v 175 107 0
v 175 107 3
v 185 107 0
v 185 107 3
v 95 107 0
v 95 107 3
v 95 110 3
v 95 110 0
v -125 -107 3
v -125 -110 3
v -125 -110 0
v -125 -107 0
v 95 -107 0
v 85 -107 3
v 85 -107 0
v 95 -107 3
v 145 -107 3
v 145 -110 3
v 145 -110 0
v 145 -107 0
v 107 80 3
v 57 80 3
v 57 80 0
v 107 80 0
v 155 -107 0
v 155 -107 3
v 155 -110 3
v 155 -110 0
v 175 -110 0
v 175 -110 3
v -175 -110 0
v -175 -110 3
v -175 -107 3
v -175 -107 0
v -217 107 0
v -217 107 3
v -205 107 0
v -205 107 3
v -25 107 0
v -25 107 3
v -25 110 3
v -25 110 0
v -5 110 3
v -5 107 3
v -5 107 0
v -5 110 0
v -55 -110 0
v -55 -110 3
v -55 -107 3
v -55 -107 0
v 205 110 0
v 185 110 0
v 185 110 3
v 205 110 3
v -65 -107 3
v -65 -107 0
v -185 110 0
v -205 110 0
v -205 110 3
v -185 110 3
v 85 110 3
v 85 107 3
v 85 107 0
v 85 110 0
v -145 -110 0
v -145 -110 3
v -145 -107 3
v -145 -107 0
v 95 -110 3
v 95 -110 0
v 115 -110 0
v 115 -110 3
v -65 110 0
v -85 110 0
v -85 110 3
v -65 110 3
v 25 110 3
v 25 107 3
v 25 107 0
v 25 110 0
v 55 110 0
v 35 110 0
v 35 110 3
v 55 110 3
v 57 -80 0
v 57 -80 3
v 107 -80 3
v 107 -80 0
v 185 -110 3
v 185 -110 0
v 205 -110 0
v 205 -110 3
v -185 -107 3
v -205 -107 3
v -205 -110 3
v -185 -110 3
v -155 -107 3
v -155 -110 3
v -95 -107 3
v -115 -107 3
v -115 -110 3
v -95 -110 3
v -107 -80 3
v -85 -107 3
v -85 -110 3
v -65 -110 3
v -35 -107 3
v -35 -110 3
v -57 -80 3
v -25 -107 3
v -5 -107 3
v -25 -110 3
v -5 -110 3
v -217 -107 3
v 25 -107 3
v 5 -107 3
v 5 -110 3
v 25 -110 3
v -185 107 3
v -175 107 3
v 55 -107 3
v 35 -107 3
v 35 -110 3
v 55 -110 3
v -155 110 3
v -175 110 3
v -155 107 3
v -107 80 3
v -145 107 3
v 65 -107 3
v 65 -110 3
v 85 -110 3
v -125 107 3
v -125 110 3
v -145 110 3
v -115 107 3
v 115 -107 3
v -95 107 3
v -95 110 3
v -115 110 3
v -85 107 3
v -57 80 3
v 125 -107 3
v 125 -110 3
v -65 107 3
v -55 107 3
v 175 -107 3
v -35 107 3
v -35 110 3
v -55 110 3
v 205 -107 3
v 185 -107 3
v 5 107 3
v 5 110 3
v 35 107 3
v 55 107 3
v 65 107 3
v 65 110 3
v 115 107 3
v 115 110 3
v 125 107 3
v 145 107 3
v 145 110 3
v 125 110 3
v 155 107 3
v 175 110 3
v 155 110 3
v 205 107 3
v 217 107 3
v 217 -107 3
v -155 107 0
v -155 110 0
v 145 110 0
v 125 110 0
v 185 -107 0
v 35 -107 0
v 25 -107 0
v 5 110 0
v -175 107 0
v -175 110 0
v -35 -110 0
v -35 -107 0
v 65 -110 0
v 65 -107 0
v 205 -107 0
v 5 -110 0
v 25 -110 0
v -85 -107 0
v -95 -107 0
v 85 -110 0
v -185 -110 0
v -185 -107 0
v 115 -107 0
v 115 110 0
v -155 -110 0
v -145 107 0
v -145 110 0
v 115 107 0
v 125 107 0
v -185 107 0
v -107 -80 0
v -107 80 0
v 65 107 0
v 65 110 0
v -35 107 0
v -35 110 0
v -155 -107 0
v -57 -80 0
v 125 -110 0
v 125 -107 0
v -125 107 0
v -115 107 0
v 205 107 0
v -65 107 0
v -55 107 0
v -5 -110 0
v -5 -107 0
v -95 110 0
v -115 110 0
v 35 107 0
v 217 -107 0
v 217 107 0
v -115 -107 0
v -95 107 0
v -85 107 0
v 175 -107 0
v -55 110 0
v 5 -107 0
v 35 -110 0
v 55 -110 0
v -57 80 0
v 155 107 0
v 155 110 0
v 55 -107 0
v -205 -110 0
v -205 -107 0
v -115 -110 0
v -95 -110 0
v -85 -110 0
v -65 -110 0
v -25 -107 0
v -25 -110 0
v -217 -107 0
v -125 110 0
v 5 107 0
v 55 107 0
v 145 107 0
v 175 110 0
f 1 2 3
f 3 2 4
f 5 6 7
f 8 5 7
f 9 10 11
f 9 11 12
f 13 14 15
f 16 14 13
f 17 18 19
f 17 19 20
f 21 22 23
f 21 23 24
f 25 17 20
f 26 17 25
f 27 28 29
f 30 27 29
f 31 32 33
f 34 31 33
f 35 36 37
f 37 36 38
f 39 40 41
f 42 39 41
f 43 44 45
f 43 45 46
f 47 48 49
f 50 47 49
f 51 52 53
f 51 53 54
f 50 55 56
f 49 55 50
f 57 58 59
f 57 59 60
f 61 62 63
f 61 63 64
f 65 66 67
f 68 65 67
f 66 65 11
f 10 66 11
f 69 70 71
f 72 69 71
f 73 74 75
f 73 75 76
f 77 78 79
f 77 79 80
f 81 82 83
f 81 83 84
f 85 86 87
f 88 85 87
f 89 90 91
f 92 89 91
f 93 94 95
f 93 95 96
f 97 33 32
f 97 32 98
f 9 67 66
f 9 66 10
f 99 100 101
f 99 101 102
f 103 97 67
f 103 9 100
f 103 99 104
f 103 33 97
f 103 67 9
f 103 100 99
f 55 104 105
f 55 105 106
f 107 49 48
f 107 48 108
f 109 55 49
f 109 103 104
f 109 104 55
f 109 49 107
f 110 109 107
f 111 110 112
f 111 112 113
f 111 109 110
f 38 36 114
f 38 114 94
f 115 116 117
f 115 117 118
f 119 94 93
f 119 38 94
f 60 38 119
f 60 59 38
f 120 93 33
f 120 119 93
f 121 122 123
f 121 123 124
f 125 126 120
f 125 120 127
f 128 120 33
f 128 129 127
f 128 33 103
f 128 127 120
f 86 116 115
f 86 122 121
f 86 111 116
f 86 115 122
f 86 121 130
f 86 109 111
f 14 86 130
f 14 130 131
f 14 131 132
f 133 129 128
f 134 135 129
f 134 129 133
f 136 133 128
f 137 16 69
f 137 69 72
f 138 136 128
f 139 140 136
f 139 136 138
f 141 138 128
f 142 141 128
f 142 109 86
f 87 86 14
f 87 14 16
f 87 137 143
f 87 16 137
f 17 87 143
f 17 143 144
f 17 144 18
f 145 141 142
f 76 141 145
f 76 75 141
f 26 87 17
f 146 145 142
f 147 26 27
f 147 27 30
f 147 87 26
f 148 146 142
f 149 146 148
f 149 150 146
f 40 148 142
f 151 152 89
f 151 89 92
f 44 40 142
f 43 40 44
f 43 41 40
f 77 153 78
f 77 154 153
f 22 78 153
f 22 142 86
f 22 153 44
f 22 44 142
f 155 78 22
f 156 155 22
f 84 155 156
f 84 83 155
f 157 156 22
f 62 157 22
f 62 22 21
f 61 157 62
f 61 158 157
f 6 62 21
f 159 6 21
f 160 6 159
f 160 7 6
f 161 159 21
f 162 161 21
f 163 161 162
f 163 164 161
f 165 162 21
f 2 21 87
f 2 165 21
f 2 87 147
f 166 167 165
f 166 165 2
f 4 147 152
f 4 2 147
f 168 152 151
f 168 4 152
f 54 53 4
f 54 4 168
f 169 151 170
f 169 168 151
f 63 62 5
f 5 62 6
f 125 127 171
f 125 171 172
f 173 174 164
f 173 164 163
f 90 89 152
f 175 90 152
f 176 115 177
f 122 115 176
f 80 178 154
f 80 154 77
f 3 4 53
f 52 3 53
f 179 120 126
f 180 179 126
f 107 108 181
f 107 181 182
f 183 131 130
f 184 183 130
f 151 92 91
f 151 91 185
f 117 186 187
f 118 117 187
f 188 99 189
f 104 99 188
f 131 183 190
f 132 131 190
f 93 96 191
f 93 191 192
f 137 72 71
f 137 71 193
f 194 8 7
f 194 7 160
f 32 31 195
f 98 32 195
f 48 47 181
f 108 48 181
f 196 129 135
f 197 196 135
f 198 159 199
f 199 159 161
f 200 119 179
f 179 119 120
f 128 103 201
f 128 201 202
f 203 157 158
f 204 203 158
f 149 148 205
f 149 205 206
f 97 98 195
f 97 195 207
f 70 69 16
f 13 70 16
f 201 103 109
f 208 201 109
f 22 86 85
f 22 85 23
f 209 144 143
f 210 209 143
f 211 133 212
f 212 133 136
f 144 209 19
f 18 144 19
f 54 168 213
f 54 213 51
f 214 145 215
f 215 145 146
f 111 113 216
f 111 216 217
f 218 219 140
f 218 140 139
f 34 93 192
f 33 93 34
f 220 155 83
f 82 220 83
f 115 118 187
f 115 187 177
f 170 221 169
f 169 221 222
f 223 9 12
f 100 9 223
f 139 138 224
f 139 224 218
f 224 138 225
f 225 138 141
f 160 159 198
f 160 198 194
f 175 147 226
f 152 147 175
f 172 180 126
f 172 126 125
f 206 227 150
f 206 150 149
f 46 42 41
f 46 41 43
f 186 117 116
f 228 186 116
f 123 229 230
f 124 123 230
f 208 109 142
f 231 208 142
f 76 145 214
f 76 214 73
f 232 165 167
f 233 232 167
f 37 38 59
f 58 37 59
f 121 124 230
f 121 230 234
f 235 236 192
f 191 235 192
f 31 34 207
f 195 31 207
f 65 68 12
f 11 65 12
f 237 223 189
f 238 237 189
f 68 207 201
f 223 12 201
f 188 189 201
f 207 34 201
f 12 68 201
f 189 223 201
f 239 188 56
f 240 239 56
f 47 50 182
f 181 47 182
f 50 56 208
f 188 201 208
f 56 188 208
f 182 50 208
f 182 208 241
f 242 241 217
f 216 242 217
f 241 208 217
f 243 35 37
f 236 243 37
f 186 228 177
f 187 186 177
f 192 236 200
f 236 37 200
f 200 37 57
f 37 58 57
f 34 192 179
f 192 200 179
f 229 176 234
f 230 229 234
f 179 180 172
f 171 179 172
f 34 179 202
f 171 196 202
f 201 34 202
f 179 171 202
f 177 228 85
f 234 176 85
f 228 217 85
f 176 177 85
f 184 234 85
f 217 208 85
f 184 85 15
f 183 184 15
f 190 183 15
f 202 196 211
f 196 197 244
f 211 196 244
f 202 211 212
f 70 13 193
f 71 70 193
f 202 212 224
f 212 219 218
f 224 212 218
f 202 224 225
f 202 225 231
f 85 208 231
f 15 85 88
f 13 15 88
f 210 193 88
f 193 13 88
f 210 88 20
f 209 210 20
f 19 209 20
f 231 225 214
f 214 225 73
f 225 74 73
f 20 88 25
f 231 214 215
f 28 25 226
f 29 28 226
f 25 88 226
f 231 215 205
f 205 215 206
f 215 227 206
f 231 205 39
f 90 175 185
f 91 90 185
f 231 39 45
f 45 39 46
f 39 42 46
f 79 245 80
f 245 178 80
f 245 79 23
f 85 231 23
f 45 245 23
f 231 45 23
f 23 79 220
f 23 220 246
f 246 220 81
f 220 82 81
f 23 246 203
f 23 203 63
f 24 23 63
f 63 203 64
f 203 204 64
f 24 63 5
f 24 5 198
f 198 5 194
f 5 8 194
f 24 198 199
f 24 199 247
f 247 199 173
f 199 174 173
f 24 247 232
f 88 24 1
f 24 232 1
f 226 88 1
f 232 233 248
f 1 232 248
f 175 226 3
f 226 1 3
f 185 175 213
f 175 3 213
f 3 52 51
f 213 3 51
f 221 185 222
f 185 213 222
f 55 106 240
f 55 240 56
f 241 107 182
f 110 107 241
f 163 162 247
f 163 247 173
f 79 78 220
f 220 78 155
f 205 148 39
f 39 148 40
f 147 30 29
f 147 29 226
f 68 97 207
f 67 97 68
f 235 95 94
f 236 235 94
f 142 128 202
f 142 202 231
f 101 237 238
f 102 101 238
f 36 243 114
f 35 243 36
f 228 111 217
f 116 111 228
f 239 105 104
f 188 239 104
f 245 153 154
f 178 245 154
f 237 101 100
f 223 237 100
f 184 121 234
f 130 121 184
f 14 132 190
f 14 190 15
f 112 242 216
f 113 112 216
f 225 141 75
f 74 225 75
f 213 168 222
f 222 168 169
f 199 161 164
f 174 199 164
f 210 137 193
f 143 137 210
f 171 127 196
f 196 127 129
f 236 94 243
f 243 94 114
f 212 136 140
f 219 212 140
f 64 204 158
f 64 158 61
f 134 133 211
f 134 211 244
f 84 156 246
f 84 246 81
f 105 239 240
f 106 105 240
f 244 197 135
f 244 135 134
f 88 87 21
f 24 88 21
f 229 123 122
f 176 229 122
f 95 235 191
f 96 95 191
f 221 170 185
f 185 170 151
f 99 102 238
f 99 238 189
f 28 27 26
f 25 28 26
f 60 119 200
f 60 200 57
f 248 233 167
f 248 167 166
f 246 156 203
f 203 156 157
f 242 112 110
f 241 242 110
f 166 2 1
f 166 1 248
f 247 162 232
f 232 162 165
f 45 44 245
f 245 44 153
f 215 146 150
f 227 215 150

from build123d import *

# Parameters (mm, degrees)
ESQUISSE1_W             = 434
ESQUISSE1_H             = 220
BOSS_EXTRU_1_DEPTH      = 3
ESQUISSE2_W             = 10
ESQUISSE2_H             = 3
ESQUISSE2_W_2           = 2
ENL_V_MAT_EXTRU_1_DEPTH = 3
ESQUISSE3_W             = 50
ESQUISSE3_H             = 160
ENL_V_MAT_EXTRU_2_DEPTH = 3


with BuildPart() as part:
    # Esquisse1 → Boss.-Extru.1 (new body)
    with BuildSketch(Plane.XY):
        Rectangle(ESQUISSE1_W, ESQUISSE1_H)
    extrude(amount=BOSS_EXTRU_1_DEPTH)

    # Esquisse2 → Enlèv. mat.-Extru.1 (cut)
    with BuildSketch(Plane.XY.offset(3)):
        with Locations((-210, 108.5)):
            Rectangle(ESQUISSE2_W, ESQUISSE2_H)
        with Locations((-180, 108.5)):
            Rectangle(ESQUISSE2_W, ESQUISSE2_H)
        with Locations((-150, 108.5)):
            Rectangle(ESQUISSE2_W, ESQUISSE2_H)
        with Locations((-120, 108.5)):
            Rectangle(ESQUISSE2_W, ESQUISSE2_H)
        with Locations((-90, 108.5)):
            Rectangle(ESQUISSE2_W, ESQUISSE2_H)
        with Locations((-30, 108.5)):
            Rectangle(ESQUISSE2_W, ESQUISSE2_H)
        with Locations((30, 108.5)):
            Rectangle(ESQUISSE2_W, ESQUISSE2_H)
        with Locations((60, 108.5)):
            Rectangle(ESQUISSE2_W, ESQUISSE2_H)
        with Locations((90, 108.5)):
            Rectangle(ESQUISSE2_W, ESQUISSE2_H)
        with Locations((120, 108.5)):
            Rectangle(ESQUISSE2_W, ESQUISSE2_H)
        with Locations((150, 108.5)):
            Rectangle(ESQUISSE2_W, ESQUISSE2_H)
        with Locations((180, 108.5)):
            Rectangle(ESQUISSE2_W, ESQUISSE2_H)
        with Locations((210, 108.5)):
            Rectangle(ESQUISSE2_W, ESQUISSE2_H)
        with Locations((210, -108.5)):
            Rectangle(ESQUISSE2_W, ESQUISSE2_H)
        with Locations((180, -108.5)):
            Rectangle(ESQUISSE2_W, ESQUISSE2_H)
        with Locations((150, -108.5)):
            Rectangle(ESQUISSE2_W, ESQUISSE2_H)
        with Locations((90, -108.5)):
            Rectangle(ESQUISSE2_W, ESQUISSE2_H)
        with Locations((60, -108.5)):
            Rectangle(ESQUISSE2_W, ESQUISSE2_H)
        with Locations((-30, -108.5)):
            Rectangle(ESQUISSE2_W, ESQUISSE2_H)
        with Locations((-60, -108.5)):
            Rectangle(ESQUISSE2_W, ESQUISSE2_H)
        with Locations((-90, -108.5)):
            Rectangle(ESQUISSE2_W, ESQUISSE2_H)
        with Locations((-120, -108.5)):
            Rectangle(ESQUISSE2_W, ESQUISSE2_H)
        with Locations((-150, -108.5)):
            Rectangle(ESQUISSE2_W, ESQUISSE2_H)
        with Locations((-210, -108.5)):
            Rectangle(ESQUISSE2_W, ESQUISSE2_H)
        with Locations((-180, -108.5)):
            Rectangle(ESQUISSE2_W, ESQUISSE2_H)
        with Locations((-216, -108.5)):
            Rectangle(ESQUISSE2_W_2, ESQUISSE2_H)
        with Locations((-216, 108.5)):
            Rectangle(ESQUISSE2_W_2, ESQUISSE2_H)
        with Locations((-60, 108.5)):
            Rectangle(ESQUISSE2_W, ESQUISSE2_H)
        with Locations((0, 108.5)):
            Rectangle(ESQUISSE2_W, ESQUISSE2_H)
        with Locations((120, -108.5)):
            Rectangle(ESQUISSE2_W, ESQUISSE2_H)
        with Locations((30, -108.5)):
            Rectangle(ESQUISSE2_W, ESQUISSE2_H)
        with Locations((0, -108.5)):
            Rectangle(ESQUISSE2_W, ESQUISSE2_H)
        with Locations((216, 108.5)):
            Rectangle(ESQUISSE2_W_2, ESQUISSE2_H)
        with Locations((216, -108.5)):
            Rectangle(ESQUISSE2_W_2, ESQUISSE2_H)
    extrude(amount=-ENL_V_MAT_EXTRU_1_DEPTH, mode=Mode.SUBTRACT)

    # Esquisse3 → Enlèv. mat.-Extru.2 (cut)
    with BuildSketch(Plane.XY.offset(3)):
        with Locations((-82, 0)):
            Rectangle(ESQUISSE3_W, ESQUISSE3_H)
        with Locations((82, 0)):
            Rectangle(ESQUISSE3_W, ESQUISSE3_H)
    extrude(amount=-ENL_V_MAT_EXTRU_2_DEPTH, mode=Mode.SUBTRACT)


solid = part.part
